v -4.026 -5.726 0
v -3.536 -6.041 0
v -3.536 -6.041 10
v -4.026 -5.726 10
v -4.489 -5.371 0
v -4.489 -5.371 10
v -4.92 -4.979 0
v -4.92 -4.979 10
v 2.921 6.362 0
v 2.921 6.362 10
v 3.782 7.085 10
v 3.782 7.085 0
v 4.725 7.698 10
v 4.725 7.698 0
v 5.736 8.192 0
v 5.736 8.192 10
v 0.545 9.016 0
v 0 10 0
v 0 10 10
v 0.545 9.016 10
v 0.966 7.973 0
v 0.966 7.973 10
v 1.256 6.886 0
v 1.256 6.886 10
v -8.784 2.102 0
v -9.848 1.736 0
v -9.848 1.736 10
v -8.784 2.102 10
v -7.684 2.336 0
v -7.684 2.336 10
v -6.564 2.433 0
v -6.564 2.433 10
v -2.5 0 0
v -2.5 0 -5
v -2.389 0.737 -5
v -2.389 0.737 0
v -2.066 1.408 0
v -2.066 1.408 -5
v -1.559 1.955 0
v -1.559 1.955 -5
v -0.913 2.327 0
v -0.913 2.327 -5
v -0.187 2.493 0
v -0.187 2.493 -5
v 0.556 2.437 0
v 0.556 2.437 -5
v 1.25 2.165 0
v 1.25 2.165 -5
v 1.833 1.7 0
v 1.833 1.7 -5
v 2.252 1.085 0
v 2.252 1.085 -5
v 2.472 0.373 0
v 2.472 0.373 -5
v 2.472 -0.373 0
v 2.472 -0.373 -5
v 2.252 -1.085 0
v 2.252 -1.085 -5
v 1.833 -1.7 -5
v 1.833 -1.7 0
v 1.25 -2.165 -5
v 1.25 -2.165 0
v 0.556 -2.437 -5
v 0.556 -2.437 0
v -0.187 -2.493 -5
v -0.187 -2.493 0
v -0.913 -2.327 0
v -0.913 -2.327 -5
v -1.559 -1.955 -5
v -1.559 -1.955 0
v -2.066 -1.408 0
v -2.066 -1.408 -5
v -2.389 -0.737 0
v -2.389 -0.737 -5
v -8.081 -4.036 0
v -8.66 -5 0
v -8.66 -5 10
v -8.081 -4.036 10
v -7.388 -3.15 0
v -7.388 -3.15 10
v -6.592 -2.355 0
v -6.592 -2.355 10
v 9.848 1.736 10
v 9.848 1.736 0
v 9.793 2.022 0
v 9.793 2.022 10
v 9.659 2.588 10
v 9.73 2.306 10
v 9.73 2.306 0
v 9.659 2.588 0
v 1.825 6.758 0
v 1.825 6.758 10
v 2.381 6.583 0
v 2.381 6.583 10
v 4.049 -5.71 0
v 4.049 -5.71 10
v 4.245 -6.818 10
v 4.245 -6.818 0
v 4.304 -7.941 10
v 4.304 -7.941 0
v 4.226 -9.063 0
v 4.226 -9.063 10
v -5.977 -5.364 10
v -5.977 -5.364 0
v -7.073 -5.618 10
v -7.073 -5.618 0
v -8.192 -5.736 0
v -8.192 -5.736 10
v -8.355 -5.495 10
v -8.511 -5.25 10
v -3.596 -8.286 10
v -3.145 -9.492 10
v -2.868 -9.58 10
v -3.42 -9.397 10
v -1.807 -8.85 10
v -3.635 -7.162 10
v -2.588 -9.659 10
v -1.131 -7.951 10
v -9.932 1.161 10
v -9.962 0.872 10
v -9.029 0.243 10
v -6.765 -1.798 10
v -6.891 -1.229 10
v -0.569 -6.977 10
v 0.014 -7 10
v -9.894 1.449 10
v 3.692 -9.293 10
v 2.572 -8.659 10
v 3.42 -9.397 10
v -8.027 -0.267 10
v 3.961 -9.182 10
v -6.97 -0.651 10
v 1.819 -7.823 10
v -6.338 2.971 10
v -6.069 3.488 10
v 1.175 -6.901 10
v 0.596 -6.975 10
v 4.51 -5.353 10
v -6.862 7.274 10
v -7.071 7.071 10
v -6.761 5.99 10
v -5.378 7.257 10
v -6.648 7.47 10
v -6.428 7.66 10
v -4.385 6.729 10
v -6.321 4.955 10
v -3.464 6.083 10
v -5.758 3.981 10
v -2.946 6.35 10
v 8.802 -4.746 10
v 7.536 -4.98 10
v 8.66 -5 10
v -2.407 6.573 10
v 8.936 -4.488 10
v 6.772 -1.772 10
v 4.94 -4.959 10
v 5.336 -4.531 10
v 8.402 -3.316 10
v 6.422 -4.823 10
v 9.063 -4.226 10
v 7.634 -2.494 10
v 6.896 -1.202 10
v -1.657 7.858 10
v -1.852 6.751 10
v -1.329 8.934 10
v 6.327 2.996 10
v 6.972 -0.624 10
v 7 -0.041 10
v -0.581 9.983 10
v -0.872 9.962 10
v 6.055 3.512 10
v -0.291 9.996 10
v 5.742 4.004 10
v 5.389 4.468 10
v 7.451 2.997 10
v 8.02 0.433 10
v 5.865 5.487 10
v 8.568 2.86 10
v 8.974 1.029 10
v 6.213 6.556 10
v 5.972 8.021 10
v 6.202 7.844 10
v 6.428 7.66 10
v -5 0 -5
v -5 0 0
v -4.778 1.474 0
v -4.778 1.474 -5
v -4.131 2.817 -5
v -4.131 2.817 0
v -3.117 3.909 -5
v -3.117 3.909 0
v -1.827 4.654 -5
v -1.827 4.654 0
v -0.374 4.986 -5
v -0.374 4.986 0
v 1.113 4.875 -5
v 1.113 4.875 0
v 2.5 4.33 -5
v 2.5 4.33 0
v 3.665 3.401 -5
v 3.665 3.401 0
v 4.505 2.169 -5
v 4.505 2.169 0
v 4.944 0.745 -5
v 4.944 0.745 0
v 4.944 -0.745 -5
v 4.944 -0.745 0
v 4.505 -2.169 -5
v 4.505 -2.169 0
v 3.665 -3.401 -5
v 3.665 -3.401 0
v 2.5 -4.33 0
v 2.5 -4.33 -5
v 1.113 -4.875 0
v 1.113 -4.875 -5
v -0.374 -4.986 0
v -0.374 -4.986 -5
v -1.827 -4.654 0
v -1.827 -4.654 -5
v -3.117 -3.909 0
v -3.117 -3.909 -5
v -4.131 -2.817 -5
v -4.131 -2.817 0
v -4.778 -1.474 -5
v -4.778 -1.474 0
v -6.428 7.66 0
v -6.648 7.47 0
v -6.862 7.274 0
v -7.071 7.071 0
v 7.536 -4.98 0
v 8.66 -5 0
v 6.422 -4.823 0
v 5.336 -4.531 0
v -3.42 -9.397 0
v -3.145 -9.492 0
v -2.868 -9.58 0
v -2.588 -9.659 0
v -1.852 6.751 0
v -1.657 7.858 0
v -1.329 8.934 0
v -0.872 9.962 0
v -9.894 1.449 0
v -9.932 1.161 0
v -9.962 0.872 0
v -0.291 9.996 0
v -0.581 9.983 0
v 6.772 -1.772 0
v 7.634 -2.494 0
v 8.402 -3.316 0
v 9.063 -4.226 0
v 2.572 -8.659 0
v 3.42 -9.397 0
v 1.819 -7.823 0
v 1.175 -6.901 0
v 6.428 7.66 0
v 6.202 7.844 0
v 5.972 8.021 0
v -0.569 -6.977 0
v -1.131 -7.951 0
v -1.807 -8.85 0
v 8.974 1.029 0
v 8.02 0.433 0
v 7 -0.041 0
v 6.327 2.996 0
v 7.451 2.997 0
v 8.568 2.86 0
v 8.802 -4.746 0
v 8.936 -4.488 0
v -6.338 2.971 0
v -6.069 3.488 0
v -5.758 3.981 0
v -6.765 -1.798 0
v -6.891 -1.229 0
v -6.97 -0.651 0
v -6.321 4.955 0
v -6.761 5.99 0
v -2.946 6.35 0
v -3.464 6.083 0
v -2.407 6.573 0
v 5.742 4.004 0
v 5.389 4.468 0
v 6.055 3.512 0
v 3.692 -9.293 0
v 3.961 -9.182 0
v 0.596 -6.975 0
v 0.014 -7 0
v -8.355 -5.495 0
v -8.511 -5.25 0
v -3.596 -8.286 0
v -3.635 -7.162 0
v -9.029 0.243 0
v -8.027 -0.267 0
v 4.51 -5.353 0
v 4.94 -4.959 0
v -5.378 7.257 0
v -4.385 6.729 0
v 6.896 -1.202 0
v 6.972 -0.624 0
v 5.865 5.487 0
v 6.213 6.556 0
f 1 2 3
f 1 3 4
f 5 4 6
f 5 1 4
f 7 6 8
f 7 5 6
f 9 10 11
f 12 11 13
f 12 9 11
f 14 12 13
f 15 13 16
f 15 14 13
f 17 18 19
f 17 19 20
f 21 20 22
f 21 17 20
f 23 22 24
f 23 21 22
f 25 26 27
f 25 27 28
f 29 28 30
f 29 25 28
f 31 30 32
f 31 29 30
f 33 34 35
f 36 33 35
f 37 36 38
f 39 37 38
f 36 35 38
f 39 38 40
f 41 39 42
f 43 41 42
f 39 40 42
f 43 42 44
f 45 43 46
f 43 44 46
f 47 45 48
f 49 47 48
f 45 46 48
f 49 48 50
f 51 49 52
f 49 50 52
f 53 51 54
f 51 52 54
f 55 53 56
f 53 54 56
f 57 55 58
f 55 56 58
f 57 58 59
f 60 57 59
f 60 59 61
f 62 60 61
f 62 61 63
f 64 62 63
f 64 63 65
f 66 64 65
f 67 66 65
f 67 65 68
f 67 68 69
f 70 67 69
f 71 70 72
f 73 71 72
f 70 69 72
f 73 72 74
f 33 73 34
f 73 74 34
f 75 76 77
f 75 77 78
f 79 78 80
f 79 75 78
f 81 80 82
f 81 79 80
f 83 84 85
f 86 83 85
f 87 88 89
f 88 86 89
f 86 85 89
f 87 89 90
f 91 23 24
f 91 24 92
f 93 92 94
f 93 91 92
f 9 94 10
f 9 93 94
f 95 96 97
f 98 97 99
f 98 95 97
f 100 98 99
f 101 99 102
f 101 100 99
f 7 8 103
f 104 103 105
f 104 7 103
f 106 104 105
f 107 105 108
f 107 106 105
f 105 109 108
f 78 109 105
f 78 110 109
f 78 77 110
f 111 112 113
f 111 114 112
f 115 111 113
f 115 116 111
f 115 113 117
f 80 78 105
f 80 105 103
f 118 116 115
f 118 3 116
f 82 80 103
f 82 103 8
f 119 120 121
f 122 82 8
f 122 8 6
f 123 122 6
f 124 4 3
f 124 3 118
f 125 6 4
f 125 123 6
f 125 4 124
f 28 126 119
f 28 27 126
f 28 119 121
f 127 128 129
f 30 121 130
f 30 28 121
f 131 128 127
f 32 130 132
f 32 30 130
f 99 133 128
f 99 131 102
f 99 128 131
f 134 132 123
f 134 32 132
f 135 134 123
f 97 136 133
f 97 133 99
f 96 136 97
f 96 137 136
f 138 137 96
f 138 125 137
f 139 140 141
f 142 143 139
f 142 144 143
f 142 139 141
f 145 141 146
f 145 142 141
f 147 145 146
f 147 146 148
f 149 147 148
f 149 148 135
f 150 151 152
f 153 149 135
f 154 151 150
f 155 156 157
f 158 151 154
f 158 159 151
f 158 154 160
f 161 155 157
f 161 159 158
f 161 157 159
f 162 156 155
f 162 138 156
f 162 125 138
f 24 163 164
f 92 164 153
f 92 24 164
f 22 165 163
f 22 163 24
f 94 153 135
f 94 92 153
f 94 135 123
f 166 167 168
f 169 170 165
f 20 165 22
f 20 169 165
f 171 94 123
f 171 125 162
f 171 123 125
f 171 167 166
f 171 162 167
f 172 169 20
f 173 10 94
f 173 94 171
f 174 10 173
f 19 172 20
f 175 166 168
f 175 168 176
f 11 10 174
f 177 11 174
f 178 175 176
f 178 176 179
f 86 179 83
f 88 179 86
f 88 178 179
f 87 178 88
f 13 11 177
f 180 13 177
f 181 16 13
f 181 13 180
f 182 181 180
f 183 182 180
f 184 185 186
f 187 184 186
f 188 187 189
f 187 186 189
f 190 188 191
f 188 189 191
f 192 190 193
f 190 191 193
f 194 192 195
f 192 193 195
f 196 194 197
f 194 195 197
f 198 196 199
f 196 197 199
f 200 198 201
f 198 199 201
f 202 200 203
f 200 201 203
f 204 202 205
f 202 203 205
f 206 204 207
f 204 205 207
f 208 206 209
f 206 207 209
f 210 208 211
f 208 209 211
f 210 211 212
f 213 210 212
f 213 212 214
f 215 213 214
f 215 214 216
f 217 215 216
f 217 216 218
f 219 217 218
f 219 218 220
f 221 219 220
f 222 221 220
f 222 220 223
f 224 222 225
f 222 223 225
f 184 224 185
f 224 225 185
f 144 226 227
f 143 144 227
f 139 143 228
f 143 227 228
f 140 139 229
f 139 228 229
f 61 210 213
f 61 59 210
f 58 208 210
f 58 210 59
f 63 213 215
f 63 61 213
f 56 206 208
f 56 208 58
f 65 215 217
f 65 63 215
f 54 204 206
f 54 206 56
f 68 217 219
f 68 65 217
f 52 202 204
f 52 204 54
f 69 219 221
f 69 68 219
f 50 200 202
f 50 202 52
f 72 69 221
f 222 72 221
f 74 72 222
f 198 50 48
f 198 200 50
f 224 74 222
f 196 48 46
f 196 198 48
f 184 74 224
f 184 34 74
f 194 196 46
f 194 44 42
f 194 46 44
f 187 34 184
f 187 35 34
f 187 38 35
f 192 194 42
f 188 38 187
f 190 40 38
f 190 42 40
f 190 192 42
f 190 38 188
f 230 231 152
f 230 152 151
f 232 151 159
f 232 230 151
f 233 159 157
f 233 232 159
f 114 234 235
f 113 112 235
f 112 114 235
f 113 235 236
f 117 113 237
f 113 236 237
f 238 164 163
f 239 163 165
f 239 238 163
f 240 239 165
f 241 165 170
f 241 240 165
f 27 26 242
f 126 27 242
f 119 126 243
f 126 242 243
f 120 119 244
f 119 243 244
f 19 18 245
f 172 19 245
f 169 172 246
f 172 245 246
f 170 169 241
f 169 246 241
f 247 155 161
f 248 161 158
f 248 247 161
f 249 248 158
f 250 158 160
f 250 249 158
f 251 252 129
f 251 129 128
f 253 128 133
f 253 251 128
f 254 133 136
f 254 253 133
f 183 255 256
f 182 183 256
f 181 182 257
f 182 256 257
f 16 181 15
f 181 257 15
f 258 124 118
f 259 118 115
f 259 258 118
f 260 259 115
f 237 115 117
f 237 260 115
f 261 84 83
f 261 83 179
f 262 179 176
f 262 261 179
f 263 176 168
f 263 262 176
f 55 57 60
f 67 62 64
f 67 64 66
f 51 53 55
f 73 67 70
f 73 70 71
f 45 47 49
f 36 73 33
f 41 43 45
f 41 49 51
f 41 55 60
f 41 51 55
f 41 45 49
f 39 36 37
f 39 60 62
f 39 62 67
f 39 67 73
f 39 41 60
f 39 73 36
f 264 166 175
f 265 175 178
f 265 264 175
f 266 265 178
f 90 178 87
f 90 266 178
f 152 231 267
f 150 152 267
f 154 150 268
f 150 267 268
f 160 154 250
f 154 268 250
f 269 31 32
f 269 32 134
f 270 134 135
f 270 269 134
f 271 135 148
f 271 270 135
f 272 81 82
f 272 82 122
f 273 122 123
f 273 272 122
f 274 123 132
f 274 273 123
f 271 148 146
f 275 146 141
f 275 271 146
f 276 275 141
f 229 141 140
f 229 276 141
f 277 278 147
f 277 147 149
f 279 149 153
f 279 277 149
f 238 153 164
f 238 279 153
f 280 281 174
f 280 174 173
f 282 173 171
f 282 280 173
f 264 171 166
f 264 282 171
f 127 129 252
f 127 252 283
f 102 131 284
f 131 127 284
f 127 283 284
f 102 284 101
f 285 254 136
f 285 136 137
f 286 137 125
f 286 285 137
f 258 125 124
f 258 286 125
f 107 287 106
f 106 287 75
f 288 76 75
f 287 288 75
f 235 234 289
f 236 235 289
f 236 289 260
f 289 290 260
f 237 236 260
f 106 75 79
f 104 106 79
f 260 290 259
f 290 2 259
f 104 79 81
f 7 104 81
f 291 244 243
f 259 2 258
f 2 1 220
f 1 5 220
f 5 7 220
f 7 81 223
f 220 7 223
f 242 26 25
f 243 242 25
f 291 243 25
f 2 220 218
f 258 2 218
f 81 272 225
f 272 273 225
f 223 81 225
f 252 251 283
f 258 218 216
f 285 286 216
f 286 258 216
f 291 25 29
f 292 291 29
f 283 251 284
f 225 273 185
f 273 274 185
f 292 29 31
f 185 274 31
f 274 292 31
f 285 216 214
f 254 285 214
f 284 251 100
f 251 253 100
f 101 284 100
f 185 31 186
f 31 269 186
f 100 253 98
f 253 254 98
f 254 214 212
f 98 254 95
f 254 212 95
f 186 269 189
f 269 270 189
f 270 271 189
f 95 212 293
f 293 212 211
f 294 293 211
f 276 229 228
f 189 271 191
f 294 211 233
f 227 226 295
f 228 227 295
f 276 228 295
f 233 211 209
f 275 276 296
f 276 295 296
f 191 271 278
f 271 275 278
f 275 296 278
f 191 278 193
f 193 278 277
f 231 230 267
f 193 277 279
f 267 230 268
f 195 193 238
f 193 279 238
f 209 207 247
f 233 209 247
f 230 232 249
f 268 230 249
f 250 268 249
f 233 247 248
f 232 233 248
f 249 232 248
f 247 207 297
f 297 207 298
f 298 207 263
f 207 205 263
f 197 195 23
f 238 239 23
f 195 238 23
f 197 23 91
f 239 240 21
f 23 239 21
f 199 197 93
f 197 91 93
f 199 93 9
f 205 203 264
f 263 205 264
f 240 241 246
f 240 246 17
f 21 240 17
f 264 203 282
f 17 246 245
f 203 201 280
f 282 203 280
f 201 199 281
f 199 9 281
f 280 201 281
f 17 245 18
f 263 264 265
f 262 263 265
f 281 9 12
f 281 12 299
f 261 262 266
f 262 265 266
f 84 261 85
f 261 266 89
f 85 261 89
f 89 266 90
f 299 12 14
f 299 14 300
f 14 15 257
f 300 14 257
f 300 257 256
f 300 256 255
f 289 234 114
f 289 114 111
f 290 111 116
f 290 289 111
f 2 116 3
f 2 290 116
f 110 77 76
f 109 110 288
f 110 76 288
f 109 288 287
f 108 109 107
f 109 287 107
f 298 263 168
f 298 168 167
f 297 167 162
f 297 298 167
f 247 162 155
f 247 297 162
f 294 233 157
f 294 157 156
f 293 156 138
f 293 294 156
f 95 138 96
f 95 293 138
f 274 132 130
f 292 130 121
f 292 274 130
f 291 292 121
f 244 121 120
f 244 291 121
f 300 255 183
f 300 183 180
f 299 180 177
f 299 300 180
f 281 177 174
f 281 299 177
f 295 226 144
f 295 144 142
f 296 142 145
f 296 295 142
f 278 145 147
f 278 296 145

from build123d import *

# Parameters (mm, degrees)
ESQUISSE1_R                  = 10
BOSS_EXTRU_1_DEPTH           = 10
ESQUISSE2_R                  = 5
BOSS_EXTRU_2_DEPTH           = 5
ESQUISSE3_R                  = 2.5
ENL_V_MAT_EXTRU_2_DEPTH      = 5
ENL_V_START                  = -10
ENL_V_MAT_EXTRU_4_DEPTH      = 10
R_P_TITION_CIRCULAIRE2_COUNT = 9


with BuildPart() as part:
    # Esquisse1 → Boss.-Extru.1 (new body)
    with BuildSketch(Plane.XY):
        Circle(ESQUISSE1_R)
    extrude(amount=BOSS_EXTRU_1_DEPTH)

    # Esquisse2 → Boss.-Extru.2 (add)
    with BuildSketch(Plane(origin=(0, 0, 0), x_dir=(-1, 0, 0), z_dir=(0, 0, -1))):
        Circle(ESQUISSE2_R)
    extrude(amount=BOSS_EXTRU_2_DEPTH)

    # Esquisse3 → Enlèv. mat.-Extru.2 (cut)
    with BuildSketch(Plane(origin=(0, 0, -5), x_dir=(-1, 0, 0), z_dir=(0, 0, -1))):
        Circle(ESQUISSE3_R)
    extrude(amount=-ENL_V_MAT_EXTRU_2_DEPTH, mode=Mode.SUBTRACT)

    # Esquisse5 → Enlèv. mat.-Extru.4 (cut)
    with BuildSketch(Plane.XY.offset(10).offset(ENL_V_START)):
        with BuildLine():
            ThreePointArc((0, 10), (0.771400633, 8.500970859), (1.256296491, 6.886342943))
            ThreePointArc((1.256296491, 6.886342943), (2.104940597, 6.676018655), (2.920746205, 6.361543964))
            ThreePointArc((2.920746205, 6.361543964), (4.244062165, 7.406044884), (5.735764364, 8.191520443))
            ThreePointArc((5.735764364, 8.191520443), (3.007057995, 9.537169507), (0, 10))
        make_face()
    enl_v_mat_extru_4 = extrude(amount=ENL_V_MAT_EXTRU_4_DEPTH, mode=Mode.SUBTRACT)

    # Répétition circulaire2: Enlèv. mat.-Extru.4 ×9 about axis
    r_p_tition_circulaire2_axis = Axis((0, 0, 0), (0, 0, 1))
    for i in range(1, R_P_TITION_CIRCULAIRE2_COUNT):
        add(enl_v_mat_extru_4.rotate(r_p_tition_circulaire2_axis, i * 360 / R_P_TITION_CIRCULAIRE2_COUNT), mode=Mode.SUBTRACT)


solid = part.part
